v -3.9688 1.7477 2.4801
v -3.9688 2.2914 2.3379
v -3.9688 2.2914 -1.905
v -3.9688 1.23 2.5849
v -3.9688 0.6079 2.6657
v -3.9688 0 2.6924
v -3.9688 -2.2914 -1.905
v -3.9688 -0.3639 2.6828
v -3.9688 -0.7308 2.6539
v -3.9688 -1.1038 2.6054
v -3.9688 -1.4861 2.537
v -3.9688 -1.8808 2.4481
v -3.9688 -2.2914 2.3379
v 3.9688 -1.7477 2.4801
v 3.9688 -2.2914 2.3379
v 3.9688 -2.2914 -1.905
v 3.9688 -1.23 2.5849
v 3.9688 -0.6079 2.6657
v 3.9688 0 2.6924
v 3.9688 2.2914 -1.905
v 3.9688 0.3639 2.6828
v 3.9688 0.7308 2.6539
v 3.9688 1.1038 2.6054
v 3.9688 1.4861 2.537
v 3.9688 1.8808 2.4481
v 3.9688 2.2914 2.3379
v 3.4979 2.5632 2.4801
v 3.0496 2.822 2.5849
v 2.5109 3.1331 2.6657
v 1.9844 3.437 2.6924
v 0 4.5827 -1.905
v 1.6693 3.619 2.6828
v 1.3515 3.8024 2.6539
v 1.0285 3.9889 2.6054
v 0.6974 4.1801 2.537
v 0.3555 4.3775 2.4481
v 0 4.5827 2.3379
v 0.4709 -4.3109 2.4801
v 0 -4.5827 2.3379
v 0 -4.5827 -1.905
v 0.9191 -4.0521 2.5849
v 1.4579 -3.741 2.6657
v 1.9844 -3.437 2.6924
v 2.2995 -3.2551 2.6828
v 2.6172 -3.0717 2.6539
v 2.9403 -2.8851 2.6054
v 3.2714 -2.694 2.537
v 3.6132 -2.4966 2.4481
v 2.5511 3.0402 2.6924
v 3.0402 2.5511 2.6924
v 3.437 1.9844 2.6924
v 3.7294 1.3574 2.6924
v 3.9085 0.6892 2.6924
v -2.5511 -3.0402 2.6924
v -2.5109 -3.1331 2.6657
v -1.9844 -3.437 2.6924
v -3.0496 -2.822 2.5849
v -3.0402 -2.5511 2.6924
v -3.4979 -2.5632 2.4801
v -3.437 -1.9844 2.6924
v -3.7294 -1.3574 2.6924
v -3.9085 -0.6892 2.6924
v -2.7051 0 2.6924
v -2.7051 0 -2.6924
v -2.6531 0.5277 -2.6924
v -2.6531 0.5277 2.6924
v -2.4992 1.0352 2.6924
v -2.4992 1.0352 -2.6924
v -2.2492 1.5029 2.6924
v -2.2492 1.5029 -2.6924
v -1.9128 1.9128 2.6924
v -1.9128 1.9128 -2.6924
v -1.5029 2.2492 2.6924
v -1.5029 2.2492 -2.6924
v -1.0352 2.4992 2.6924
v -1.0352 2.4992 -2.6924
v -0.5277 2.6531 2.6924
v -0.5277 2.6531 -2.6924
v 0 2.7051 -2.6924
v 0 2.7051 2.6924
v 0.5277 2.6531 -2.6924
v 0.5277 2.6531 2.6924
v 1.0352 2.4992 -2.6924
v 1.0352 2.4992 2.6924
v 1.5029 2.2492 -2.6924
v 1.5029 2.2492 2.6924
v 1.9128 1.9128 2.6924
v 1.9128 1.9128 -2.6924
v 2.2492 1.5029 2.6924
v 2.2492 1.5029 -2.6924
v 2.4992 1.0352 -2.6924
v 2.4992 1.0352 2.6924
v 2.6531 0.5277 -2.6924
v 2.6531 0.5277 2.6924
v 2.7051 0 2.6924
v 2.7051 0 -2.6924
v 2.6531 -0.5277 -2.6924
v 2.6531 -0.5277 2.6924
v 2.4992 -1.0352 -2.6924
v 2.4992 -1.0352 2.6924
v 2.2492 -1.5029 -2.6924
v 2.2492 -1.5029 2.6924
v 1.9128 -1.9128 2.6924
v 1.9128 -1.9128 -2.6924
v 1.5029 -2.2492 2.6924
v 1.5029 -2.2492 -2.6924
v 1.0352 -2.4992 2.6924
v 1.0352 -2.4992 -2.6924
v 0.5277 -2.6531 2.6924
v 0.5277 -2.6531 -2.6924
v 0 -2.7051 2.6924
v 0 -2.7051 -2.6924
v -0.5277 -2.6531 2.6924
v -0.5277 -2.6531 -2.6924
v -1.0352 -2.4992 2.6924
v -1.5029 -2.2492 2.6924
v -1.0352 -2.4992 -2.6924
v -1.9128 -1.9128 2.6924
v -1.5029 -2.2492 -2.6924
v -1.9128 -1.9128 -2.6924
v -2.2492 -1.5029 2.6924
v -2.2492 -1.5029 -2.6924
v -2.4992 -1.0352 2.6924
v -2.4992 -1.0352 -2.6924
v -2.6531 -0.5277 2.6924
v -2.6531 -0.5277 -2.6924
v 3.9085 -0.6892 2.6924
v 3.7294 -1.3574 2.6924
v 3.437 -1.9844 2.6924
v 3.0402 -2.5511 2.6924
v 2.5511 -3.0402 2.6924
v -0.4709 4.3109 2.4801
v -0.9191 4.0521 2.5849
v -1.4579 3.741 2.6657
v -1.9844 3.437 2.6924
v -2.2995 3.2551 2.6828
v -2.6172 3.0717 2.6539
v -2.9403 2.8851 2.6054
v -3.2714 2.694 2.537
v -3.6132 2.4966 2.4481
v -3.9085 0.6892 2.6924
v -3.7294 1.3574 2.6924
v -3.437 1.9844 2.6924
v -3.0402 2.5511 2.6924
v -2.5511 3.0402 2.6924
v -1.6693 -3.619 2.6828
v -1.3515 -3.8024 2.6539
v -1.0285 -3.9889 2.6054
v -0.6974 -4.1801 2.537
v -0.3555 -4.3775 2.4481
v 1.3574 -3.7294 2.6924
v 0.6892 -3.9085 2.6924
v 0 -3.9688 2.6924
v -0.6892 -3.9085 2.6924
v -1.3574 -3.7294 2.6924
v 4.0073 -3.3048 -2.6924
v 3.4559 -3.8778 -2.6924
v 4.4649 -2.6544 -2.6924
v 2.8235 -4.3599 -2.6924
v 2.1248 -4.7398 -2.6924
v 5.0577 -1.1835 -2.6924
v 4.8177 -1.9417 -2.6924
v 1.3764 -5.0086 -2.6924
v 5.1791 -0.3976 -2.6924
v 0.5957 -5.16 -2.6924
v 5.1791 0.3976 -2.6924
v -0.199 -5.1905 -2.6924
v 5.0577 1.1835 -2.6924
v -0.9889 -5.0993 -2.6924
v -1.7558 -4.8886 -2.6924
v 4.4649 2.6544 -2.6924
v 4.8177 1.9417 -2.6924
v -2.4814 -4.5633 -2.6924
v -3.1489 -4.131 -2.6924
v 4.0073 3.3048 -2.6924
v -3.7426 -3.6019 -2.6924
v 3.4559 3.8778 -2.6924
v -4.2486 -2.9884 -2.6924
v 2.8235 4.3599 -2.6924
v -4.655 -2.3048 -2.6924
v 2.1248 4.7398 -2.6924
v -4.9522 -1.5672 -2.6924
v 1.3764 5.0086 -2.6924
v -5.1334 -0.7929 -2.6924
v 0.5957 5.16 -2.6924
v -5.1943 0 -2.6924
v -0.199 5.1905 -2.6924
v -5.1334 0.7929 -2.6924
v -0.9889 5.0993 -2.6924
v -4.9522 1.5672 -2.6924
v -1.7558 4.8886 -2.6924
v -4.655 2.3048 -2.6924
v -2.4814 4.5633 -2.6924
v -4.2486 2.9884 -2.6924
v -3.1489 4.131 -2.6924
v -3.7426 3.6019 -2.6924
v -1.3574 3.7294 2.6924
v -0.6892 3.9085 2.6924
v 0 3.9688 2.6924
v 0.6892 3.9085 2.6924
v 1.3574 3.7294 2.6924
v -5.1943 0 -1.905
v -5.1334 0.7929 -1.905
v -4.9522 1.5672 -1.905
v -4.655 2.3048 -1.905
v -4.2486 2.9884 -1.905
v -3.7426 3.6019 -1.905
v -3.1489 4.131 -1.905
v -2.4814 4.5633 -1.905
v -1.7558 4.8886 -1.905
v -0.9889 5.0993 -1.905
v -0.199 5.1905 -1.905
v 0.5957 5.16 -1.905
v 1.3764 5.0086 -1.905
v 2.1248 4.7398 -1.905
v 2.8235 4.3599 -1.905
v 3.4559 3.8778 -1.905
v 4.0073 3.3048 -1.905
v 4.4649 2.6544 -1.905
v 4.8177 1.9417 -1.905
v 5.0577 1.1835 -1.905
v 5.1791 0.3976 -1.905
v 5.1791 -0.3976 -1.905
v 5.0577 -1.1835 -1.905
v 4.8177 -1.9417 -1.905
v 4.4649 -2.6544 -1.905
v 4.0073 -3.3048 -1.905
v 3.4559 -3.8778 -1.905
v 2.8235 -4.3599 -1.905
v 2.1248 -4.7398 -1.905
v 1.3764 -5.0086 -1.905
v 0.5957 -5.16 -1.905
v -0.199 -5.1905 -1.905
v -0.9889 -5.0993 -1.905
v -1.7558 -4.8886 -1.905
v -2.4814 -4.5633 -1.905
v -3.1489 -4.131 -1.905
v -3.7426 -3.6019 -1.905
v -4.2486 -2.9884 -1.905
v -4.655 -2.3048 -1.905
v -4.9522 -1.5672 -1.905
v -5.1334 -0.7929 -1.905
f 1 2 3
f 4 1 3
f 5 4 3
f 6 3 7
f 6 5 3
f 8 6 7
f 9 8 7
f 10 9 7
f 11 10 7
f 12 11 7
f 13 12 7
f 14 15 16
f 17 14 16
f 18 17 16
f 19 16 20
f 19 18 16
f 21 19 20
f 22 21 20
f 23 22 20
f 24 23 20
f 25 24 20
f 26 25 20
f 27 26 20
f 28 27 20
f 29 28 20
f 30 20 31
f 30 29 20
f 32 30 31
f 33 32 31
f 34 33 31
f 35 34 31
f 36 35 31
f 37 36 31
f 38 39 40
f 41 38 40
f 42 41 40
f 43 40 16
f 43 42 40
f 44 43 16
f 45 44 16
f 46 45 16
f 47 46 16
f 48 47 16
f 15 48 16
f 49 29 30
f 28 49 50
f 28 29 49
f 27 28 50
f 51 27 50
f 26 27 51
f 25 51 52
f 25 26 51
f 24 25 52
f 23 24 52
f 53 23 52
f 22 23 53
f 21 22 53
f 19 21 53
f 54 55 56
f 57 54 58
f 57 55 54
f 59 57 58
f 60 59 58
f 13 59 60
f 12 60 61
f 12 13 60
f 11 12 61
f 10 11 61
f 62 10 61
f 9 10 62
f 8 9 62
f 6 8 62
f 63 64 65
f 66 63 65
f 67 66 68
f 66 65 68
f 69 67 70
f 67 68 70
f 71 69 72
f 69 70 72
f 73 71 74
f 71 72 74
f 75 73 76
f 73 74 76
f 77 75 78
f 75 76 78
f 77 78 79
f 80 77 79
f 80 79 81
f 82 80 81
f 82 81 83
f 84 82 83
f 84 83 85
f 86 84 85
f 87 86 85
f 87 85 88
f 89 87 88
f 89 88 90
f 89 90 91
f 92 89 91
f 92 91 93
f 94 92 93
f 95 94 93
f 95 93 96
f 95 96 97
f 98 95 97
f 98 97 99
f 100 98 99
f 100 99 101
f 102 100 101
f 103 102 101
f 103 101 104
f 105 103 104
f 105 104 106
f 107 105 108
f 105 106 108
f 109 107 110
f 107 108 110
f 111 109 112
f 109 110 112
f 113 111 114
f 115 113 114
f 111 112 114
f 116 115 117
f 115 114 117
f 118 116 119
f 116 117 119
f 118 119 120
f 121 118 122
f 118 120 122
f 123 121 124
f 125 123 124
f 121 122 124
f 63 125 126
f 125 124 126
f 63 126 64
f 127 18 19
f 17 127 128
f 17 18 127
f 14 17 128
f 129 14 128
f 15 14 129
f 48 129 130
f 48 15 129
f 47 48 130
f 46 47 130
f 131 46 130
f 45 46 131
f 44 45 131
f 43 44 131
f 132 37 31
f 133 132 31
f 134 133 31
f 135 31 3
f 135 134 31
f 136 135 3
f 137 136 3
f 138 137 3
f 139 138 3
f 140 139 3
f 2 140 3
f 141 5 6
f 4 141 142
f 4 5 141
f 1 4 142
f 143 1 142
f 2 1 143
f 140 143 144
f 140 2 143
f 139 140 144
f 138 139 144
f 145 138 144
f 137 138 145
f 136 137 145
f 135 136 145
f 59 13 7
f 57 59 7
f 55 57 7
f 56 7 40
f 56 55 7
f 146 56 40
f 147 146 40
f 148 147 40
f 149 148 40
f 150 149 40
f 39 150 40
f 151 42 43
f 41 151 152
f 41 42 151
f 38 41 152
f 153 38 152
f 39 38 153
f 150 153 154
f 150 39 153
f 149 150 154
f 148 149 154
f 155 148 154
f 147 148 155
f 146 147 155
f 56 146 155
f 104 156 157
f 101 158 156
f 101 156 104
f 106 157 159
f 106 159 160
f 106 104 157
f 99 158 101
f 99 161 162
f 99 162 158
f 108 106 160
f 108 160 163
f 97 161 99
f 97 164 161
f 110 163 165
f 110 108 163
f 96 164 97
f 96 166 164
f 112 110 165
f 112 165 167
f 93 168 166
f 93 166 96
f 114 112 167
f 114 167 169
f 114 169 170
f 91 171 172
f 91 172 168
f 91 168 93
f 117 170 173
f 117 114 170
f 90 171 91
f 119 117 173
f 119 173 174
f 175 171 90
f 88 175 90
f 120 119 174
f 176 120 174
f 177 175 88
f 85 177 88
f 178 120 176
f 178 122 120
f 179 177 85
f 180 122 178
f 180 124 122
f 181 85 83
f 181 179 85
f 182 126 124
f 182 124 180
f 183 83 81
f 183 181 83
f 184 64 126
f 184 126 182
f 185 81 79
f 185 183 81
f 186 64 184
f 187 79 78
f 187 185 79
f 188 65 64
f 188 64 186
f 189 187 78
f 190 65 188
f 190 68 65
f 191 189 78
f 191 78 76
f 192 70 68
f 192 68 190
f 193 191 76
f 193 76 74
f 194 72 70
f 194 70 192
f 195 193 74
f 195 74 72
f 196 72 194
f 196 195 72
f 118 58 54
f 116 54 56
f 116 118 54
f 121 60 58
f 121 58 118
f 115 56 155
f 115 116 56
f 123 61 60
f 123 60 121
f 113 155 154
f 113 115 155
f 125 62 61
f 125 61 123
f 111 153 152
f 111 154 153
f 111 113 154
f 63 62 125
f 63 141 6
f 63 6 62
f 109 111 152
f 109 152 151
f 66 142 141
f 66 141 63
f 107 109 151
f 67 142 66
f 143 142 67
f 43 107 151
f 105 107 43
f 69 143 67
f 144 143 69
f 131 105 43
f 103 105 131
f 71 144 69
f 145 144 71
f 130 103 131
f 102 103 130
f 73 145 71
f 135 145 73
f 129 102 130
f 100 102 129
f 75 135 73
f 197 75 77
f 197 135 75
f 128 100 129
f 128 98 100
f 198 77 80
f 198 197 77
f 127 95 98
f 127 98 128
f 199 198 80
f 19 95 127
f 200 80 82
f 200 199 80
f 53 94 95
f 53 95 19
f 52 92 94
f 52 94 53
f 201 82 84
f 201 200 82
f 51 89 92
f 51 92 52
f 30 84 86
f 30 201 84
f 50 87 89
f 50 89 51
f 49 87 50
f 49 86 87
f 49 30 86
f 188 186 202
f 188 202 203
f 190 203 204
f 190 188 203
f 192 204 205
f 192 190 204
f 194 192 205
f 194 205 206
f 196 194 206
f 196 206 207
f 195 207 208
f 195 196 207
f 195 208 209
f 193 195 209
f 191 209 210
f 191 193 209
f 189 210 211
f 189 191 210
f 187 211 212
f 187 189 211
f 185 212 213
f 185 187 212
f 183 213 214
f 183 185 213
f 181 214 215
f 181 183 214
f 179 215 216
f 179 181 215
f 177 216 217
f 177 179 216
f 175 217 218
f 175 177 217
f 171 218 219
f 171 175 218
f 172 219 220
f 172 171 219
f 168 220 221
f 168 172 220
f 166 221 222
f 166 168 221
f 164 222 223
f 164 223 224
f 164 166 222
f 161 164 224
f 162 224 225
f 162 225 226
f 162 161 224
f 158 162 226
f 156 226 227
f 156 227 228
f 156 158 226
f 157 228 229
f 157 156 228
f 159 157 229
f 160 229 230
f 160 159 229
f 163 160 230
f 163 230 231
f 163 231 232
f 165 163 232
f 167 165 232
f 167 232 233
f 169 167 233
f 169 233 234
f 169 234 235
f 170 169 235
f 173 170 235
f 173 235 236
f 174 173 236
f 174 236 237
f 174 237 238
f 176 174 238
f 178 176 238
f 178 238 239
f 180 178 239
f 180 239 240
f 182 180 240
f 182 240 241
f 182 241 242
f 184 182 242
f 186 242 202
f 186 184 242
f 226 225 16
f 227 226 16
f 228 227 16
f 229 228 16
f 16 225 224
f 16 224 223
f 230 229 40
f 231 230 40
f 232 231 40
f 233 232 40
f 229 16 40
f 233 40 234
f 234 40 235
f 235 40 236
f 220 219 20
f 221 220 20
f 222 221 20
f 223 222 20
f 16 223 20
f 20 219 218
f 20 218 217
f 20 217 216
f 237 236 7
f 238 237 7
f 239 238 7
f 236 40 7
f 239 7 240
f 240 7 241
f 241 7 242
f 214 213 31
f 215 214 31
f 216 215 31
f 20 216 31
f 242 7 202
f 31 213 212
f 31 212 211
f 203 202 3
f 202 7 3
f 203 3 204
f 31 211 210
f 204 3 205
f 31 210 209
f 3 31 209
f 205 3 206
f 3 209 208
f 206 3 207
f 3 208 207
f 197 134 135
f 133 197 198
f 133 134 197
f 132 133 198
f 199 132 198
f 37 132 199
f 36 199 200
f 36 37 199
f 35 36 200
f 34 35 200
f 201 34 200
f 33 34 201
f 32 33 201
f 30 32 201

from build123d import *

# Parameters (mm, degrees)
EXTRUDE1_DEPTH          = 2.6924
SKETCH2_OUTSIDE_W       = 34.708
SKETCH2_OUTSIDE_H       = 35.936
SKETCH2_OUTSIDE_R       = 3.96875
CUT_EXTRUDE1_DEPTH      = 6.3848
CUT_EXTRUDE1_TAPER      = 60
SKETCH17_R              = 5.1943
EXTRUDE3_DEPTH          = 0.7874
F_1_4_28_TAPPED_HOLE1_D = 5.4102


with BuildPart() as part:
    # Sketch1 → Extrude1 (new body, symmetric)
    with BuildSketch(Plane.XY):
        Polygon((3.96875, -2.291358881), (3.96875, 2.291358881), (0, 4.582717762), (-3.96875, 2.291358881), (-3.96875, -2.291358881), (0, -4.582717762), align=None)
    extrude(amount=EXTRUDE1_DEPTH, both=True)

    # Sketch2 outside → Cut-Extrude1 (cut, through all)
    with BuildSketch(Plane.XY.offset(2.6924)):
        Rectangle(SKETCH2_OUTSIDE_W, SKETCH2_OUTSIDE_H)
        Circle(SKETCH2_OUTSIDE_R, mode=Mode.SUBTRACT)
    extrude(amount=-CUT_EXTRUDE1_DEPTH, taper=CUT_EXTRUDE1_TAPER, mode=Mode.SUBTRACT)

    # Sketch17 → Extrude3 (add)
    with BuildSketch(Plane(origin=(0, 0, -2.6924), x_dir=(-1, 0, 0), z_dir=(0, 0, -1))):
        Circle(SKETCH17_R)
    extrude(amount=-EXTRUDE3_DEPTH)

    # 1/4-28 Tapped Hole1 (through all)
    with Locations(Plane.XY.offset(2.6924)):
        with Locations((0, 0)):
            Hole(F_1_4_28_TAPPED_HOLE1_D / 2)


solid = part.part
